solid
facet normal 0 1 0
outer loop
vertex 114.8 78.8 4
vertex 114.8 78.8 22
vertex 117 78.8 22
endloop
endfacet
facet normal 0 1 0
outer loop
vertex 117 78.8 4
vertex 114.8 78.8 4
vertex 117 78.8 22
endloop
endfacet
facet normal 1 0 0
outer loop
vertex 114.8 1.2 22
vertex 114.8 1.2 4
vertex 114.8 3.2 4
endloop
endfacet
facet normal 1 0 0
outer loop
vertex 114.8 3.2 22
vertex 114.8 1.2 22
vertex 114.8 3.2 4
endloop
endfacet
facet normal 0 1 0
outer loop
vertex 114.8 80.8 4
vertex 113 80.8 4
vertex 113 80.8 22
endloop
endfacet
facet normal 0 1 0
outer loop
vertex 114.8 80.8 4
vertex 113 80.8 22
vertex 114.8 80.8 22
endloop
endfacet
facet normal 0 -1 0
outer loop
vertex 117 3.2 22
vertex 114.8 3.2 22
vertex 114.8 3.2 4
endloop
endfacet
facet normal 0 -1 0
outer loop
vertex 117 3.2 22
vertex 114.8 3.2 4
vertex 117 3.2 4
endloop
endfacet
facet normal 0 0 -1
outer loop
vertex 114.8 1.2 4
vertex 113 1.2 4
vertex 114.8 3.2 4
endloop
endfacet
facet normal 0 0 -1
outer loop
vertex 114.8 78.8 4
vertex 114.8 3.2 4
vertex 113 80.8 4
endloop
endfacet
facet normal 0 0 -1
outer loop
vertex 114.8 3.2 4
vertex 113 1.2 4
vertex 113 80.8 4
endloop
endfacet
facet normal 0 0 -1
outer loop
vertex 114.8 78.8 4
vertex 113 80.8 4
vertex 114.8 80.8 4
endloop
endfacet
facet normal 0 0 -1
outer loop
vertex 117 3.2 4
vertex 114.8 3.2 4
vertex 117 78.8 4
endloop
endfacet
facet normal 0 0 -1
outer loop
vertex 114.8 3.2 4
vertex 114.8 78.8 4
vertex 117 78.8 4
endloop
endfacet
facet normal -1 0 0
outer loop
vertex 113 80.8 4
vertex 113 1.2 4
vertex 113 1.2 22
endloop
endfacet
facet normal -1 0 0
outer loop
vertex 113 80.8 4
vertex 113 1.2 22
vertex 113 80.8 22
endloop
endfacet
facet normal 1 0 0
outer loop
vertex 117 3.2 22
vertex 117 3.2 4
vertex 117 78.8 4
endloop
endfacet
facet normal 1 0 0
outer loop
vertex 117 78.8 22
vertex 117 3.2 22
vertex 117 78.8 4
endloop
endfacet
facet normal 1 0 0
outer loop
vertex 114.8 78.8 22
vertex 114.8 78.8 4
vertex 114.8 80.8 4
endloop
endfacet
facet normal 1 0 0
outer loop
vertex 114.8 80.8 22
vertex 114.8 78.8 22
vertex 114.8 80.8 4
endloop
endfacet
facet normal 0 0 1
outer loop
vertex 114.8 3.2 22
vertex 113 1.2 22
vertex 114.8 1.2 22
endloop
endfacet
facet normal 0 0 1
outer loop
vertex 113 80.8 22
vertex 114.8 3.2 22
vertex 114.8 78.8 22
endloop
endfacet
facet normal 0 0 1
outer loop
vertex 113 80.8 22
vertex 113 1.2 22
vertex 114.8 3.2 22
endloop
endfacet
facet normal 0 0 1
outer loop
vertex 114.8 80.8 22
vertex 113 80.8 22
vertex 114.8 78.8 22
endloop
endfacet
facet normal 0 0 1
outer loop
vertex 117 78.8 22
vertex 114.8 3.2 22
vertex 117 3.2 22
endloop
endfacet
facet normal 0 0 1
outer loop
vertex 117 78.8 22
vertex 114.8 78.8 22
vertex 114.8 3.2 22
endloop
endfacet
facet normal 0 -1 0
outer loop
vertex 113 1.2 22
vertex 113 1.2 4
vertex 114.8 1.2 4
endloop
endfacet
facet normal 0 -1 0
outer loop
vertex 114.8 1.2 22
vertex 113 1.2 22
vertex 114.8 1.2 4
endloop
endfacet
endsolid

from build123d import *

# Parameters (mm, degrees)
BOX021_W     = 10
BOX021_H     = 10
BOX021_DEPTH = 31
BOX020_W     = 10
BOX020_H     = 10
BOX020_DEPTH = 30
BOX019_W     = 10
BOX019_H     = 10
BOX019_DEPTH = 25
BOX018_W     = 10
BOX018_H     = 10
BOX018_DEPTH = 25
BOX010_W     = 2
BOX010_H     = 80
BOX010_DEPTH = 18
BOX011_W     = 4
BOX011_H     = 76
BOX011_DEPTH = 18


with BuildPart() as w_rfel018:
    # Box021 → Box021 (new body)
    with BuildSketch(Plane(origin=(110, 80.8, 0), x_dir=(1, 0, 0), z_dir=(0, 0, 1))):
        with Locations((5, 5)):
            Rectangle(BOX021_W, BOX021_H)
    extrude(amount=BOX021_DEPTH)


with BuildPart() as w_rfel017:
    # Box020 → Box020 (new body)
    with BuildSketch(Plane(origin=(109, -8.8, 0), x_dir=(1, 0, 0), z_dir=(0, 0, 1))):
        with Locations((5, 5)):
            Rectangle(BOX020_W, BOX020_H)
    extrude(amount=BOX020_DEPTH)


with BuildPart() as w_rfel016:
    # Box019 → Box019 (new body)
    with BuildSketch(Plane(origin=(114.8, 78.8, 0), x_dir=(1, 0, 0), z_dir=(0, 0, 1))):
        with Locations((5, 5)):
            Rectangle(BOX019_W, BOX019_H)
    extrude(amount=BOX019_DEPTH)


with BuildPart() as w_rfel015:
    # Box018 → Box018 (new body)
    with BuildSketch(Plane(origin=(114.8, -6.8, 0), x_dir=(1, 0, 0), z_dir=(0, 0, 1))):
        with Locations((5, 5)):
            Rectangle(BOX018_W, BOX018_H)
    extrude(amount=BOX018_DEPTH)


with BuildPart() as f_hrung001:
    # Box010 → Box010 (new body)
    with BuildSketch(Plane(origin=(113, 1, 23), x_dir=(1, 0, 0), z_dir=(0, 0, 1))):
        with Locations((1, 40)):
            Rectangle(BOX010_W, BOX010_H)
    extrude(amount=BOX010_DEPTH)


with BuildPart() as front:
    # Box011 → Box011 (new body)
    with BuildSketch(Plane(origin=(113, 3, 23), x_dir=(1, 0, 0), z_dir=(0, 0, 1))):
        with Locations((2, 38)):
            Rectangle(BOX011_W, BOX011_H)
    extrude(amount=BOX011_DEPTH)

    # Fusion010: union Führung001
    add(f_hrung001.part)


with BuildPart() as front_1:
    # Fusion010 placement: moved
    add(front.part.moved(Location((0, 0, -19))))

    # Cut013: cut Würfel015
    add(w_rfel015.part, mode=Mode.SUBTRACT)

    # Cut014: cut Würfel016
    add(w_rfel016.part, mode=Mode.SUBTRACT)

    # Cut015: cut Würfel017
    add(w_rfel017.part, mode=Mode.SUBTRACT)

    # Cut016: cut Würfel018
    add(w_rfel018.part, mode=Mode.SUBTRACT)


solid = front_1.part
